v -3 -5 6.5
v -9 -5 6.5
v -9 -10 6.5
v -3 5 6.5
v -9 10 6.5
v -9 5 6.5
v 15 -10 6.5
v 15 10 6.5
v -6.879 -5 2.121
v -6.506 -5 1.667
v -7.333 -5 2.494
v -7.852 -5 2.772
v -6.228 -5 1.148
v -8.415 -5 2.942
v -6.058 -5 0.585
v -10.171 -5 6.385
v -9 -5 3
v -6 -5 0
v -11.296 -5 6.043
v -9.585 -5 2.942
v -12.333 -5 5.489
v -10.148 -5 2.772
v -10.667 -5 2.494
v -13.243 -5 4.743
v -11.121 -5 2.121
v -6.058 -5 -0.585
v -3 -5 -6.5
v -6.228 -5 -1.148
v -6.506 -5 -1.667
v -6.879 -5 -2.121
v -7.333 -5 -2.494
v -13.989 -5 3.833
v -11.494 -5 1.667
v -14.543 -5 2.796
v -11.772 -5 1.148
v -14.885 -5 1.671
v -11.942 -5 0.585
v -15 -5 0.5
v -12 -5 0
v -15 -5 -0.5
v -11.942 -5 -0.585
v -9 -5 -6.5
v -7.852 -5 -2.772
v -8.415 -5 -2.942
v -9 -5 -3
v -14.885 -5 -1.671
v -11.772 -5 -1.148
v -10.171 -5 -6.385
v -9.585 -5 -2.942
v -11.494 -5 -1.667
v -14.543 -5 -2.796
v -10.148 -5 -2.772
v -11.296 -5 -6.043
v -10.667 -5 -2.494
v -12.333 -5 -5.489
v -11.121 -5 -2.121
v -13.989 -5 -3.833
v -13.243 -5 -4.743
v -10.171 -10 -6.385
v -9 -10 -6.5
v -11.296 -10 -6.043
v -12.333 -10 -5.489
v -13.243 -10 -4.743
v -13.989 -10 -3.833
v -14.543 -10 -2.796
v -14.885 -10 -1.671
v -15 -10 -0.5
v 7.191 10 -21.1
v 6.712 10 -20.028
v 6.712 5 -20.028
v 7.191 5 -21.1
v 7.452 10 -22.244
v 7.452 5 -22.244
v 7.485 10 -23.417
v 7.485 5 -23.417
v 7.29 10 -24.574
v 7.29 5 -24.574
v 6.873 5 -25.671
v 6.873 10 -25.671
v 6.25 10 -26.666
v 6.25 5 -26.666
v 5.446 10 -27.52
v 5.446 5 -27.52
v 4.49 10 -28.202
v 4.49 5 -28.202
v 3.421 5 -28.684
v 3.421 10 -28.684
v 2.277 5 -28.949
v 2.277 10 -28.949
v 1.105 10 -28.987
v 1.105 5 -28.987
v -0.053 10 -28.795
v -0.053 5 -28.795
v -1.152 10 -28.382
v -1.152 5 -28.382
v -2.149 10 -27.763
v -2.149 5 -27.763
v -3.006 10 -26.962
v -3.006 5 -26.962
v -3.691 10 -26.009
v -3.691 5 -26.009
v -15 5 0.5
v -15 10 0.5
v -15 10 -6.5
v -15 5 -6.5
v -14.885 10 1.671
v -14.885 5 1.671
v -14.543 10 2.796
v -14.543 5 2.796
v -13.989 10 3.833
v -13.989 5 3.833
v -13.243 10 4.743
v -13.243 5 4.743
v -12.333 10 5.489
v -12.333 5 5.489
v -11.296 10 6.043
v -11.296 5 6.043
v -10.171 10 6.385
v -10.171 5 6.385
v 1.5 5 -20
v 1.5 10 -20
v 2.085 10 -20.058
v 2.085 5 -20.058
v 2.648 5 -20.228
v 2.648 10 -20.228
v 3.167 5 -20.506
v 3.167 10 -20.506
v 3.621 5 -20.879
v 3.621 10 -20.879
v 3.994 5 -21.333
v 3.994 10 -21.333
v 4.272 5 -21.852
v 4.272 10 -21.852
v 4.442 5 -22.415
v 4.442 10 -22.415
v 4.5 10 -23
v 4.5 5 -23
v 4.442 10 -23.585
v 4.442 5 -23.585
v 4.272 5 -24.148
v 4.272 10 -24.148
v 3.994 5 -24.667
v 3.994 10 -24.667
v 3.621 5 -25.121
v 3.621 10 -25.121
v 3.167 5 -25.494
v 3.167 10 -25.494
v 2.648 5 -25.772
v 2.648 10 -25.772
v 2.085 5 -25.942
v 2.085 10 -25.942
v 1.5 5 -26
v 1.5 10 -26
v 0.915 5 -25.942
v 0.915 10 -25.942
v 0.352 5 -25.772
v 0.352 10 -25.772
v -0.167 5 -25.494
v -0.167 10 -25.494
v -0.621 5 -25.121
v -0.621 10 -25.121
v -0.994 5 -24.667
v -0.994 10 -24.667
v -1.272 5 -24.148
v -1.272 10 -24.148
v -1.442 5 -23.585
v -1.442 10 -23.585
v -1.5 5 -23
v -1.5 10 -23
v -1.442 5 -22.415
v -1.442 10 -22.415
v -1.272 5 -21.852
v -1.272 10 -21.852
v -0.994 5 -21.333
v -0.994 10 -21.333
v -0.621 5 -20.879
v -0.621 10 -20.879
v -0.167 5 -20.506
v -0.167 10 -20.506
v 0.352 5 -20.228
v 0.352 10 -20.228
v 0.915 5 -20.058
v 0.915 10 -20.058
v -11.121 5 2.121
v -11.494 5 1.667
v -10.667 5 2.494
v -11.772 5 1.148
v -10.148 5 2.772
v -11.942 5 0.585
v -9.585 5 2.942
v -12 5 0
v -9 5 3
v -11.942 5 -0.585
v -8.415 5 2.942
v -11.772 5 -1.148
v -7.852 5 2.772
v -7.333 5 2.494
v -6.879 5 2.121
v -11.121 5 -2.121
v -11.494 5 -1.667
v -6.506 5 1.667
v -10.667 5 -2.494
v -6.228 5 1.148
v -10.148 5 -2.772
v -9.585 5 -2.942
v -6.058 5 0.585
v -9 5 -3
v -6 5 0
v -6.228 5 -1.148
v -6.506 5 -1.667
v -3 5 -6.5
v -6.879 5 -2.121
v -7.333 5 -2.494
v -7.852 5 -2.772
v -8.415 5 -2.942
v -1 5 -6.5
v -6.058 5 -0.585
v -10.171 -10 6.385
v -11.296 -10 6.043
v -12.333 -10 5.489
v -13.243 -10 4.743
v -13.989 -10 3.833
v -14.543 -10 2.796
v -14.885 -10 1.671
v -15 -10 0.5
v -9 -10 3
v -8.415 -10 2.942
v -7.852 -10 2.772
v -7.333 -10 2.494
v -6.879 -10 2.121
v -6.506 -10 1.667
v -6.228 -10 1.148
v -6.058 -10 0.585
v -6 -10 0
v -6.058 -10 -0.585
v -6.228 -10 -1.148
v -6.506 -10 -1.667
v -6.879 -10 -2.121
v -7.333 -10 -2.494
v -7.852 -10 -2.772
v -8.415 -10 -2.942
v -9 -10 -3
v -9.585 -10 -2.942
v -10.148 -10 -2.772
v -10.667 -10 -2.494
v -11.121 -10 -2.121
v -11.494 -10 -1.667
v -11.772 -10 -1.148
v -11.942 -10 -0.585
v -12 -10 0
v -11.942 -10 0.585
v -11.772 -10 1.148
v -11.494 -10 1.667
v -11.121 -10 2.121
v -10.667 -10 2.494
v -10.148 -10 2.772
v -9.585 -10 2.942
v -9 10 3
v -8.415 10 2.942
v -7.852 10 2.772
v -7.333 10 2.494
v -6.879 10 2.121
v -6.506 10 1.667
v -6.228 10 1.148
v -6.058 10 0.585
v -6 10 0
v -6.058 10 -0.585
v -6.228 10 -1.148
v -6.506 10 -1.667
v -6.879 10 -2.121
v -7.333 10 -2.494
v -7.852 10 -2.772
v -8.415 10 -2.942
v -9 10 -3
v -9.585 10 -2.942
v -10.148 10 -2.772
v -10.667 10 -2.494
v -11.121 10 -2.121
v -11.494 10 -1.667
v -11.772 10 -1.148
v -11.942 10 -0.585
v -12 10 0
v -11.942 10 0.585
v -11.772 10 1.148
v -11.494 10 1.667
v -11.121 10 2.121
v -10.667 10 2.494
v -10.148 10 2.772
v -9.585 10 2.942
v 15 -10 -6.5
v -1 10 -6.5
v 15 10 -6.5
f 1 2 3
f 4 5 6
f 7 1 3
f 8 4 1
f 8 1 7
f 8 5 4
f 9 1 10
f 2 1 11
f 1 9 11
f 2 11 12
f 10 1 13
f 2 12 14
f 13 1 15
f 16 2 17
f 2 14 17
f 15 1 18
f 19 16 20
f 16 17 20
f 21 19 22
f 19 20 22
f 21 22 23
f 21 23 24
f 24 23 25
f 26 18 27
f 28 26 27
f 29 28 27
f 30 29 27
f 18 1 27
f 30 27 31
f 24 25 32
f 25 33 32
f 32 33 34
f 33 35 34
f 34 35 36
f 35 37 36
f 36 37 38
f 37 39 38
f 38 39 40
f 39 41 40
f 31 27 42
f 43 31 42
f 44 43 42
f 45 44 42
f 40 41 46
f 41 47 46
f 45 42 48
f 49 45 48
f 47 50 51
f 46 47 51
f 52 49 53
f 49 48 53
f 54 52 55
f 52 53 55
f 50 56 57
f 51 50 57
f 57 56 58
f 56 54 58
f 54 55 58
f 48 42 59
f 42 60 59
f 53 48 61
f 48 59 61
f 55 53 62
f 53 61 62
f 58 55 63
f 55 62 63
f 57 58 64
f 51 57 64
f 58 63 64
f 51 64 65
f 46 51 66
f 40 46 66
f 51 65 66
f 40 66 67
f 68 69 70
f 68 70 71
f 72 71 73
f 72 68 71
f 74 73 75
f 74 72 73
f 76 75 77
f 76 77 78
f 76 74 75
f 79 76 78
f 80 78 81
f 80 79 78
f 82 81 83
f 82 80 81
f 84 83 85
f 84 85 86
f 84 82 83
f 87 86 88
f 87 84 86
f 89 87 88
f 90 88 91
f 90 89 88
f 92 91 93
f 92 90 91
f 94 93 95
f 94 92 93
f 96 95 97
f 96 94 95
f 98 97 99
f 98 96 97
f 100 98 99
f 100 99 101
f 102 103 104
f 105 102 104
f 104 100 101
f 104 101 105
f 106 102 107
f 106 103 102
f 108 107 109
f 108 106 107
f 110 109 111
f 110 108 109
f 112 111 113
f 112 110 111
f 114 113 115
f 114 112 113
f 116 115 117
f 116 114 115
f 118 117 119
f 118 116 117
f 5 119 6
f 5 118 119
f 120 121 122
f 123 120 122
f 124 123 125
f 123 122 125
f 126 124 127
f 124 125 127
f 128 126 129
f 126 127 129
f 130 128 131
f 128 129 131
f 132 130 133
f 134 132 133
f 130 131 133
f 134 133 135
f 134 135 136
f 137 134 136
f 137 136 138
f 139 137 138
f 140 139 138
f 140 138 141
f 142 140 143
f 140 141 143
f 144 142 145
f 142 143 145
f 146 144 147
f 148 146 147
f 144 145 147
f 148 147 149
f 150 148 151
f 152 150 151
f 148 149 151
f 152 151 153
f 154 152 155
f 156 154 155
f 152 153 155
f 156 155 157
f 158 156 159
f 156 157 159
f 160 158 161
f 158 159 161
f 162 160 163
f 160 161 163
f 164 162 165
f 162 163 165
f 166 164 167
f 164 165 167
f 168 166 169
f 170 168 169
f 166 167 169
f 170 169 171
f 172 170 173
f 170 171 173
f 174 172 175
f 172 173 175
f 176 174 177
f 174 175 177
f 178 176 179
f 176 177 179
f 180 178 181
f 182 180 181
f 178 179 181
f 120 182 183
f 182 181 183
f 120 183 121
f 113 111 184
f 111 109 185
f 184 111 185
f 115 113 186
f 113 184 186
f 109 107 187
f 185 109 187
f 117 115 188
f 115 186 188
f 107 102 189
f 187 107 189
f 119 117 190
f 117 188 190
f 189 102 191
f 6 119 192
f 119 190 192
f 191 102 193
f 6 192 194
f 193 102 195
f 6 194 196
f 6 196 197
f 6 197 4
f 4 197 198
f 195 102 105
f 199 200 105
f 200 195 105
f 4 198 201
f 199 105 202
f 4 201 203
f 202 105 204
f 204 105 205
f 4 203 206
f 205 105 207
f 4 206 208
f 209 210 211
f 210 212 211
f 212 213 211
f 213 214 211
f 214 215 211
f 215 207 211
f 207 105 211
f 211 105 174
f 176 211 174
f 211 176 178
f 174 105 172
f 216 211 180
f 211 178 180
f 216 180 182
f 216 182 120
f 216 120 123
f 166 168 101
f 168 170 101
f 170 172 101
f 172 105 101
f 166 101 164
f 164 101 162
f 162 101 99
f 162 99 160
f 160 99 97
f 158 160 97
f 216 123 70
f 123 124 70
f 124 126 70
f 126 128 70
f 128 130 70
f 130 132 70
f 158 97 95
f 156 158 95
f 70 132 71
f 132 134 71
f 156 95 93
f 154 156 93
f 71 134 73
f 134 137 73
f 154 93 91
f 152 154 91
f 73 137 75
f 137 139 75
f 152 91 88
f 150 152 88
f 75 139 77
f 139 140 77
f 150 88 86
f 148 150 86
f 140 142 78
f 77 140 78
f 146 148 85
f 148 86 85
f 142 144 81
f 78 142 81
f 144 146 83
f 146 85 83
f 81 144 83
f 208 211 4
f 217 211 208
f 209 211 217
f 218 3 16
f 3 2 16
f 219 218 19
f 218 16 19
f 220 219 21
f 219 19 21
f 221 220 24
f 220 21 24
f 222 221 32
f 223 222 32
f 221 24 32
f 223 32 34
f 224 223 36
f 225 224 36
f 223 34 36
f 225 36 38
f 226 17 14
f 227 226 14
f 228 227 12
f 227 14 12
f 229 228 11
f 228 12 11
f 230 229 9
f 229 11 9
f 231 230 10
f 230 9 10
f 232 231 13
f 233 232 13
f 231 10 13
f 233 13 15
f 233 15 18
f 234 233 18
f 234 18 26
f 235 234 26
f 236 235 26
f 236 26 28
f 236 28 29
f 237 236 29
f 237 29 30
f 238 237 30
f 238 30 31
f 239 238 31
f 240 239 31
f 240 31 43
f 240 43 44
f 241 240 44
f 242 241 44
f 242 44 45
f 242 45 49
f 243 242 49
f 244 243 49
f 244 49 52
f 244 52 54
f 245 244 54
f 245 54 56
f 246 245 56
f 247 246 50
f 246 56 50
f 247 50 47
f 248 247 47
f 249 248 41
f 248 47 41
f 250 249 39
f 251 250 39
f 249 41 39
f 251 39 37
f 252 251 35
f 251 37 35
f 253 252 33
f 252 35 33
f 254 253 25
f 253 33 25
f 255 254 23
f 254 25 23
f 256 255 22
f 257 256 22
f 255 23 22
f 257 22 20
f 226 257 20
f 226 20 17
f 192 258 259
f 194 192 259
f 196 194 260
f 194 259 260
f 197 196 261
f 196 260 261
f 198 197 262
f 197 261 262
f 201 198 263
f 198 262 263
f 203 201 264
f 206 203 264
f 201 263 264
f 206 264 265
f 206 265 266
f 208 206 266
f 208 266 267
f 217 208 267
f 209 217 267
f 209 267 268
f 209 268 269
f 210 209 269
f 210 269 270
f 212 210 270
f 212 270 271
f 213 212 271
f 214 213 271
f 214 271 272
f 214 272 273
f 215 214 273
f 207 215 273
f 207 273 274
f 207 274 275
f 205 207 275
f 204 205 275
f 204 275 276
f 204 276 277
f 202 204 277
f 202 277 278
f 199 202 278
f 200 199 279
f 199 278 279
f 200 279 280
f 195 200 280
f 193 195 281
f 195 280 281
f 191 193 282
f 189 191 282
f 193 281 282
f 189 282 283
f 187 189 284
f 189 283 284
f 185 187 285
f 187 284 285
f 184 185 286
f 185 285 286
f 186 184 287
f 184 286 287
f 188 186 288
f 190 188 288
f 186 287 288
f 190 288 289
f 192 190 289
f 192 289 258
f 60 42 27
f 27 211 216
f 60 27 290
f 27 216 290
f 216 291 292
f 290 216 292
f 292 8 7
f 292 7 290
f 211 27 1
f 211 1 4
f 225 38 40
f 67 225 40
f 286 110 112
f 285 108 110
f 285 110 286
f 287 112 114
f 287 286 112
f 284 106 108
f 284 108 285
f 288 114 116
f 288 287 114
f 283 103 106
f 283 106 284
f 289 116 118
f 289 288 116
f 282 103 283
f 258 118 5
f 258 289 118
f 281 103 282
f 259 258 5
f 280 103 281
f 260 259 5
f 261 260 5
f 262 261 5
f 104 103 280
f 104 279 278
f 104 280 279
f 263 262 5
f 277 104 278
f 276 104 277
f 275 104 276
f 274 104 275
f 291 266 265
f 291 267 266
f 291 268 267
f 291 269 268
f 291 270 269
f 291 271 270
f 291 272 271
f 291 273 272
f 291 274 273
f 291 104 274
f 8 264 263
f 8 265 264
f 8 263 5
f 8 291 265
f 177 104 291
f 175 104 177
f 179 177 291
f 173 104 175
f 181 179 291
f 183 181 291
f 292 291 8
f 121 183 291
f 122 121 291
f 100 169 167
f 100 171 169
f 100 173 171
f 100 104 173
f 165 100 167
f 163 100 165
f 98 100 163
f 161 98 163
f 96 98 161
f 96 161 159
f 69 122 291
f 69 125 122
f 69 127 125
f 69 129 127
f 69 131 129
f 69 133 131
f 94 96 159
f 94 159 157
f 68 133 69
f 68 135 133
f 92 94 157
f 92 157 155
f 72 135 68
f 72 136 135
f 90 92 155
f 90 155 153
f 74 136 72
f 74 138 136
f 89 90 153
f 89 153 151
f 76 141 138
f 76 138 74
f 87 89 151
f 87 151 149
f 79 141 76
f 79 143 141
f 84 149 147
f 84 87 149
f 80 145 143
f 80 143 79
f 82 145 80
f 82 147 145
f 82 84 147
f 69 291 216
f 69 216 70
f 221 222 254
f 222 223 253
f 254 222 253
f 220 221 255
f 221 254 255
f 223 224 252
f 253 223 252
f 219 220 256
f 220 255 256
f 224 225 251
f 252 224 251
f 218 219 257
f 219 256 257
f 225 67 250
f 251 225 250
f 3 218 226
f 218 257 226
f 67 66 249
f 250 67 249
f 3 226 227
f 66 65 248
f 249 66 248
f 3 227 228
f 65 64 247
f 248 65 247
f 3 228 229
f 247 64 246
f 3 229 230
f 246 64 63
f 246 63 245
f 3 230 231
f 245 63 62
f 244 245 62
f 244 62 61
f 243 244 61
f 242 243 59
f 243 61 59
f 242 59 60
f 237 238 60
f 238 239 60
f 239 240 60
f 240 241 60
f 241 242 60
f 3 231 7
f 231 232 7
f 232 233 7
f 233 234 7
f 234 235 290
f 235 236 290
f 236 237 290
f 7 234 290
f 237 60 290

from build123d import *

# Parameters (mm, degrees)
SKETCH_1_W          = 30
SKETCH_1_H          = 13
EXTRUDE_1_DEPTH     = 10
SKETCH_2_W          = 24
SKETCH_2_H          = 10
CUT_EXTRUDE_1_DEPTH = 20
SKETCH_3_R          = 3
EXTRUDE_2_DEPTH     = 5
SKETCH_4_R          = 3
CUT_EXTRUDE_2_DEPTH = 39.288379438
FILLET_1_R          = 6


with BuildPart() as part:
    # 草图1 → 凸台-拉伸1 (new, symmetric)
    with BuildSketch(Plane(origin=(0, 0, 0), x_dir=(1, 0, 0), z_dir=(0, 1, 0))):
        Rectangle(SKETCH_1_W, SKETCH_1_H)
    extrude(amount=EXTRUDE_1_DEPTH, both=True)

    # 草图2 → 切除-拉伸1 (cut)
    with BuildSketch(Plane(origin=(0, 0, -6.5), x_dir=(-1, 0, 0), z_dir=(0, 0, -1))):
        with Locations((15, 0)):
            Rectangle(SKETCH_2_W, SKETCH_2_H)
    extrude(amount=-CUT_EXTRUDE_1_DEPTH, mode=Mode.SUBTRACT)

    # 草图3 → 凸台-拉伸2 (add)
    with BuildSketch(Plane(origin=(0, 10, 0), x_dir=(1, 0, 0), z_dir=(0, 1, 0))):
        with BuildLine():
            Line((-3.690899012, 26.00908083), (-15, 6.5))
            Line((-15, 6.5), (-1, 6.5))
            Line((-1, 6.5), (6.712455076, 20.028415898))
            ThreePointArc((6.712455076, 20.028415898), (4.49035189, 28.201710831), (-3.690899012, 26.00908083))
        make_face()
        with Locations(Location((1.5, 23, 0), (0, 0, 270))):
            Circle(SKETCH_3_R, mode=Mode.SUBTRACT)
    extrude(amount=-EXTRUDE_2_DEPTH)

    # 草图4 → 切除-拉伸2 (cut, through all)
    with BuildSketch(Plane(origin=(0, 10, 0), x_dir=(1, 0, 0), z_dir=(0, 1, 0))):
        with Locations(Location((-9, 0, 0), (0, 0, 270))):
            Circle(SKETCH_4_R)
    extrude(amount=-CUT_EXTRUDE_2_DEPTH, mode=Mode.SUBTRACT)

    # 圆角1
    fillet_1_edges = [part.edges().sort_by_distance(p)[0] for p in [
        (-15, -7.5, 6.5),
        (-15, -7.5, -6.5),
        (-15, 7.5, 6.5),
    ]]
    fillet(fillet_1_edges, radius=FILLET_1_R)


solid = part.part
